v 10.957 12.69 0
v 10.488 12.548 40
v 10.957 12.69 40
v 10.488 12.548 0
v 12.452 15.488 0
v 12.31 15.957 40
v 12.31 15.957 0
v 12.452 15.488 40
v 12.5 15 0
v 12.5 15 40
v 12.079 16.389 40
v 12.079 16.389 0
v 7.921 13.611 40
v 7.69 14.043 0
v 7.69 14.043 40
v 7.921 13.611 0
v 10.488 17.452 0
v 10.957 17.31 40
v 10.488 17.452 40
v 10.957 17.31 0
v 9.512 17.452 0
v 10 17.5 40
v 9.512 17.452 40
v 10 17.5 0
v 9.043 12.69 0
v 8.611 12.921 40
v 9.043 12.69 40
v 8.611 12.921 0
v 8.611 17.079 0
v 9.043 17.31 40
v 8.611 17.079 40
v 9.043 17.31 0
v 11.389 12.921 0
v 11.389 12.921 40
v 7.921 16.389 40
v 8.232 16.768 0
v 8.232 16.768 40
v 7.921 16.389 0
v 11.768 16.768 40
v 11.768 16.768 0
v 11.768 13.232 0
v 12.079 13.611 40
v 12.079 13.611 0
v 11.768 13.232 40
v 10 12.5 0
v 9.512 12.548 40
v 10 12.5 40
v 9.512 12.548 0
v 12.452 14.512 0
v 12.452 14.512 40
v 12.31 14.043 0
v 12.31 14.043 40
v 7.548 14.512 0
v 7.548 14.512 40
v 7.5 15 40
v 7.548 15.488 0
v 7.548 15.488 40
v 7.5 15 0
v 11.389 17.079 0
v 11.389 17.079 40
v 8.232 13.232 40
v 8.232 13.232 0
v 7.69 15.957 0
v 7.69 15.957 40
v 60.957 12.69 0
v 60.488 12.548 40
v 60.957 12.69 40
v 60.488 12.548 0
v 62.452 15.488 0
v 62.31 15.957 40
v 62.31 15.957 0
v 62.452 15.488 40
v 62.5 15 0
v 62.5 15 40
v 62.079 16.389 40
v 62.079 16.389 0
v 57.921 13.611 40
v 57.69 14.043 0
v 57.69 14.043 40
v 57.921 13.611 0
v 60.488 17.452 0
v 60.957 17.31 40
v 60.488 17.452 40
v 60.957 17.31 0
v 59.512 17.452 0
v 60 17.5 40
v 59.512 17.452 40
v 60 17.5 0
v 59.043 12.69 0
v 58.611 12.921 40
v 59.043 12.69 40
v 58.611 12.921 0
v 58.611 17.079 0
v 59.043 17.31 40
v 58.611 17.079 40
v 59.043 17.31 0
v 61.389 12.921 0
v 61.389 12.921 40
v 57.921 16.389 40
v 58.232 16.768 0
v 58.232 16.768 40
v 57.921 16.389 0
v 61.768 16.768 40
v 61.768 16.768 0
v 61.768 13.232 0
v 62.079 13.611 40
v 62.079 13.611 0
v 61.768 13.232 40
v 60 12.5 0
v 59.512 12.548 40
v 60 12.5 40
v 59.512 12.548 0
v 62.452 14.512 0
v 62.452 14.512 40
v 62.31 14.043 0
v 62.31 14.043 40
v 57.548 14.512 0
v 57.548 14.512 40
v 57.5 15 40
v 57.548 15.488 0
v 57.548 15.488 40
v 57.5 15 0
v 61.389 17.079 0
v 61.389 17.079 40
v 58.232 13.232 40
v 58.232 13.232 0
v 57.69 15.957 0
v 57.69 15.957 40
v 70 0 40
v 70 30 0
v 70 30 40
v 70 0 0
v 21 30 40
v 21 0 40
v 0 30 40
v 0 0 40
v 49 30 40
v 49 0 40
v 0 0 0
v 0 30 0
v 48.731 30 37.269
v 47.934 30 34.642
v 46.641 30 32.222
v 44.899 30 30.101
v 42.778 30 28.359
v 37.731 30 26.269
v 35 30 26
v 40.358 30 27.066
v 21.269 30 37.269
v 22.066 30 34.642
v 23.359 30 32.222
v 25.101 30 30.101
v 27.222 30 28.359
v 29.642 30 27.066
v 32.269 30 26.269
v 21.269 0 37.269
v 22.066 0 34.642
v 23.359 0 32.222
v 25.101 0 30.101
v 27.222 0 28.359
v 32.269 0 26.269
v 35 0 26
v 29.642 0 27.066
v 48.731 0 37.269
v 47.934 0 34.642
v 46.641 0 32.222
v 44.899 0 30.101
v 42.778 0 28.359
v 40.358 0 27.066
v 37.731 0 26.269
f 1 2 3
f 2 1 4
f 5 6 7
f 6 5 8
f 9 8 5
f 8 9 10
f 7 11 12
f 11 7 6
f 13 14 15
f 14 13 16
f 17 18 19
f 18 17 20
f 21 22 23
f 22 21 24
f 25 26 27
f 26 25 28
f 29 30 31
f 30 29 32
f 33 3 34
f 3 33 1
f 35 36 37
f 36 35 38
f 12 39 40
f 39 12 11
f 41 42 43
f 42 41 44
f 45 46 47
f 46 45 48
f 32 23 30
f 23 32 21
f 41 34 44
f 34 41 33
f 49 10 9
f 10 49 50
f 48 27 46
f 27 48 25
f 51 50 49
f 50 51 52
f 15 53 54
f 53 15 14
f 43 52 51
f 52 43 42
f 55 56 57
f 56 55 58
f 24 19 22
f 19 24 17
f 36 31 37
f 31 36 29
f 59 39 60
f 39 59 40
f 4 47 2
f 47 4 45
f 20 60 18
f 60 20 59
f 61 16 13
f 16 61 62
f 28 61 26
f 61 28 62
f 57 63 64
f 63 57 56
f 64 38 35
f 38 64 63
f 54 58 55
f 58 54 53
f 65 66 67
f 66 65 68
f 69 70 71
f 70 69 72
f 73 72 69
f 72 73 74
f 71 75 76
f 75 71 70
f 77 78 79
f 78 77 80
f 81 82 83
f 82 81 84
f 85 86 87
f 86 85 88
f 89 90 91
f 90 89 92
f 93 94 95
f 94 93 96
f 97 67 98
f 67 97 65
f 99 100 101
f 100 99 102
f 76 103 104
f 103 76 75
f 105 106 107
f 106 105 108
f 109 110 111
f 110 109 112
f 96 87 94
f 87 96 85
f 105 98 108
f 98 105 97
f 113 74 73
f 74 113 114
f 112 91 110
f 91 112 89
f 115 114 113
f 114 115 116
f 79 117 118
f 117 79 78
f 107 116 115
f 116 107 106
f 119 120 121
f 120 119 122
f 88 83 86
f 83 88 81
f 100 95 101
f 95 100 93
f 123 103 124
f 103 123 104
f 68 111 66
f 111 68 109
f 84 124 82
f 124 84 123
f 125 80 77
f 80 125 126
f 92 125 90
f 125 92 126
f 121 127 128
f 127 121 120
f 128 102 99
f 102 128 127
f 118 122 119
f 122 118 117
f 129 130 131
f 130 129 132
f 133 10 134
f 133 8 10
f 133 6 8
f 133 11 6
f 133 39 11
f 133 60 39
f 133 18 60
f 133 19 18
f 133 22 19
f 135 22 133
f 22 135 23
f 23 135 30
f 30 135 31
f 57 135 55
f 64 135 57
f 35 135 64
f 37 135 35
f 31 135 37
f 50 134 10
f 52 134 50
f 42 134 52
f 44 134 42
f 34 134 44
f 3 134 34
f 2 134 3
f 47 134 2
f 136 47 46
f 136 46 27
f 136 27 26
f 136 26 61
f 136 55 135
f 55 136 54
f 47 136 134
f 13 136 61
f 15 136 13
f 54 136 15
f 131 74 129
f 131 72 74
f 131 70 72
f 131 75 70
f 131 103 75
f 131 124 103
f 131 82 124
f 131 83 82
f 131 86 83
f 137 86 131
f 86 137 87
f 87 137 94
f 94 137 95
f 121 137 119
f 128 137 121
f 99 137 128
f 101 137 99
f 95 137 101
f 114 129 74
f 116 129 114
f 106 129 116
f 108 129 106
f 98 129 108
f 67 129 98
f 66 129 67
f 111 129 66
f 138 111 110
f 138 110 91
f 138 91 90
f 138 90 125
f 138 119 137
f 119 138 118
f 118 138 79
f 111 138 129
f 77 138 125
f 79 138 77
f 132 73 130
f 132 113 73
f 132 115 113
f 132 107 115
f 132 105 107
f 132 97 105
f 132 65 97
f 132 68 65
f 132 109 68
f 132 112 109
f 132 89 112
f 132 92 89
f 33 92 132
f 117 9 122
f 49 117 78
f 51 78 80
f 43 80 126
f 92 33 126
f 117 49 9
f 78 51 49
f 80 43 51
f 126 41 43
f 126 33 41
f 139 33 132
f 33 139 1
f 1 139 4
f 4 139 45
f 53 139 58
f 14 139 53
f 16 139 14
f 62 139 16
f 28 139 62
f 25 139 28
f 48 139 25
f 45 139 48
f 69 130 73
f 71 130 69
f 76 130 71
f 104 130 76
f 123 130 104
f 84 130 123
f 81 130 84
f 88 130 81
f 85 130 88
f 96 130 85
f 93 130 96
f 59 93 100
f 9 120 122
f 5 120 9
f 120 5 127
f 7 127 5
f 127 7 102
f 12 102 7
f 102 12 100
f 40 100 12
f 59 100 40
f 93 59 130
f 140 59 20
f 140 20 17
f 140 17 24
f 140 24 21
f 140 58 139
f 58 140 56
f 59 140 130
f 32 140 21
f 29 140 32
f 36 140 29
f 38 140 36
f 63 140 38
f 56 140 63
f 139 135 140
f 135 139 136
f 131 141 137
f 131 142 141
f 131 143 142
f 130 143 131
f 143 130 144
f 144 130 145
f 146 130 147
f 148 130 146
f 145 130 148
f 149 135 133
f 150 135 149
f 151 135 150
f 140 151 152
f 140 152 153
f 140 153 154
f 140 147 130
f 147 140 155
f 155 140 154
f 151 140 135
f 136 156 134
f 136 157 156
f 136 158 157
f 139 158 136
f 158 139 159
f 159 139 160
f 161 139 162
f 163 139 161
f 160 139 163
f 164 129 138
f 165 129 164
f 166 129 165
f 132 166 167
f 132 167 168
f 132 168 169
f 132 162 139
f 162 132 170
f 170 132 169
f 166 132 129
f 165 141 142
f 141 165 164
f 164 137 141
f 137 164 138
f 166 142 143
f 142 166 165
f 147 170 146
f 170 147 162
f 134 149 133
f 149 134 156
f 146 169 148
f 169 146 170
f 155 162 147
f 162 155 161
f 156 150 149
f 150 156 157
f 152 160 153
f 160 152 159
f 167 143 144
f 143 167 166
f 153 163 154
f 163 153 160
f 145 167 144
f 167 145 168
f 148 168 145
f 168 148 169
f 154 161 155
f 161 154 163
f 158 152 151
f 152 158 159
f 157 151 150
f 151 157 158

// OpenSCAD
$fn = 32;

// ----------------------------------------------------------------------
// Saddle clamp: plain shaft clamp
// ----------------------------------------------------------------------

// --- parameters (mm) ---
blk_l = 70;               // block length, X
blk_w = 30;               // block width, Y
blk_h = 40;               // block height
clamp_r = 14;             // shaft groove radius
hole_r = 2.5;             // bolt hole radius
hole_m = 10;              // bolt hole margin from the ends
fit_tol = 0.02;           // tolerance for press fits, mm
free_tol = 0.2;           // tolerance for clearance fits, mm

saw_depth = clamp_r + 3;  // saw kerf depth

difference() {
  cube([blk_l, blk_w, blk_h]);
  translate([blk_l / 2, -1, blk_h])
    rotate([-90, 0, 0])
      cylinder(h = blk_w + 2, r = clamp_r);
  for (sx = [0, 1])
    translate([sx ? blk_l - hole_m : hole_m, blk_w / 2, -1])
      cylinder(r = hole_r, h = blk_h + 2);
}
